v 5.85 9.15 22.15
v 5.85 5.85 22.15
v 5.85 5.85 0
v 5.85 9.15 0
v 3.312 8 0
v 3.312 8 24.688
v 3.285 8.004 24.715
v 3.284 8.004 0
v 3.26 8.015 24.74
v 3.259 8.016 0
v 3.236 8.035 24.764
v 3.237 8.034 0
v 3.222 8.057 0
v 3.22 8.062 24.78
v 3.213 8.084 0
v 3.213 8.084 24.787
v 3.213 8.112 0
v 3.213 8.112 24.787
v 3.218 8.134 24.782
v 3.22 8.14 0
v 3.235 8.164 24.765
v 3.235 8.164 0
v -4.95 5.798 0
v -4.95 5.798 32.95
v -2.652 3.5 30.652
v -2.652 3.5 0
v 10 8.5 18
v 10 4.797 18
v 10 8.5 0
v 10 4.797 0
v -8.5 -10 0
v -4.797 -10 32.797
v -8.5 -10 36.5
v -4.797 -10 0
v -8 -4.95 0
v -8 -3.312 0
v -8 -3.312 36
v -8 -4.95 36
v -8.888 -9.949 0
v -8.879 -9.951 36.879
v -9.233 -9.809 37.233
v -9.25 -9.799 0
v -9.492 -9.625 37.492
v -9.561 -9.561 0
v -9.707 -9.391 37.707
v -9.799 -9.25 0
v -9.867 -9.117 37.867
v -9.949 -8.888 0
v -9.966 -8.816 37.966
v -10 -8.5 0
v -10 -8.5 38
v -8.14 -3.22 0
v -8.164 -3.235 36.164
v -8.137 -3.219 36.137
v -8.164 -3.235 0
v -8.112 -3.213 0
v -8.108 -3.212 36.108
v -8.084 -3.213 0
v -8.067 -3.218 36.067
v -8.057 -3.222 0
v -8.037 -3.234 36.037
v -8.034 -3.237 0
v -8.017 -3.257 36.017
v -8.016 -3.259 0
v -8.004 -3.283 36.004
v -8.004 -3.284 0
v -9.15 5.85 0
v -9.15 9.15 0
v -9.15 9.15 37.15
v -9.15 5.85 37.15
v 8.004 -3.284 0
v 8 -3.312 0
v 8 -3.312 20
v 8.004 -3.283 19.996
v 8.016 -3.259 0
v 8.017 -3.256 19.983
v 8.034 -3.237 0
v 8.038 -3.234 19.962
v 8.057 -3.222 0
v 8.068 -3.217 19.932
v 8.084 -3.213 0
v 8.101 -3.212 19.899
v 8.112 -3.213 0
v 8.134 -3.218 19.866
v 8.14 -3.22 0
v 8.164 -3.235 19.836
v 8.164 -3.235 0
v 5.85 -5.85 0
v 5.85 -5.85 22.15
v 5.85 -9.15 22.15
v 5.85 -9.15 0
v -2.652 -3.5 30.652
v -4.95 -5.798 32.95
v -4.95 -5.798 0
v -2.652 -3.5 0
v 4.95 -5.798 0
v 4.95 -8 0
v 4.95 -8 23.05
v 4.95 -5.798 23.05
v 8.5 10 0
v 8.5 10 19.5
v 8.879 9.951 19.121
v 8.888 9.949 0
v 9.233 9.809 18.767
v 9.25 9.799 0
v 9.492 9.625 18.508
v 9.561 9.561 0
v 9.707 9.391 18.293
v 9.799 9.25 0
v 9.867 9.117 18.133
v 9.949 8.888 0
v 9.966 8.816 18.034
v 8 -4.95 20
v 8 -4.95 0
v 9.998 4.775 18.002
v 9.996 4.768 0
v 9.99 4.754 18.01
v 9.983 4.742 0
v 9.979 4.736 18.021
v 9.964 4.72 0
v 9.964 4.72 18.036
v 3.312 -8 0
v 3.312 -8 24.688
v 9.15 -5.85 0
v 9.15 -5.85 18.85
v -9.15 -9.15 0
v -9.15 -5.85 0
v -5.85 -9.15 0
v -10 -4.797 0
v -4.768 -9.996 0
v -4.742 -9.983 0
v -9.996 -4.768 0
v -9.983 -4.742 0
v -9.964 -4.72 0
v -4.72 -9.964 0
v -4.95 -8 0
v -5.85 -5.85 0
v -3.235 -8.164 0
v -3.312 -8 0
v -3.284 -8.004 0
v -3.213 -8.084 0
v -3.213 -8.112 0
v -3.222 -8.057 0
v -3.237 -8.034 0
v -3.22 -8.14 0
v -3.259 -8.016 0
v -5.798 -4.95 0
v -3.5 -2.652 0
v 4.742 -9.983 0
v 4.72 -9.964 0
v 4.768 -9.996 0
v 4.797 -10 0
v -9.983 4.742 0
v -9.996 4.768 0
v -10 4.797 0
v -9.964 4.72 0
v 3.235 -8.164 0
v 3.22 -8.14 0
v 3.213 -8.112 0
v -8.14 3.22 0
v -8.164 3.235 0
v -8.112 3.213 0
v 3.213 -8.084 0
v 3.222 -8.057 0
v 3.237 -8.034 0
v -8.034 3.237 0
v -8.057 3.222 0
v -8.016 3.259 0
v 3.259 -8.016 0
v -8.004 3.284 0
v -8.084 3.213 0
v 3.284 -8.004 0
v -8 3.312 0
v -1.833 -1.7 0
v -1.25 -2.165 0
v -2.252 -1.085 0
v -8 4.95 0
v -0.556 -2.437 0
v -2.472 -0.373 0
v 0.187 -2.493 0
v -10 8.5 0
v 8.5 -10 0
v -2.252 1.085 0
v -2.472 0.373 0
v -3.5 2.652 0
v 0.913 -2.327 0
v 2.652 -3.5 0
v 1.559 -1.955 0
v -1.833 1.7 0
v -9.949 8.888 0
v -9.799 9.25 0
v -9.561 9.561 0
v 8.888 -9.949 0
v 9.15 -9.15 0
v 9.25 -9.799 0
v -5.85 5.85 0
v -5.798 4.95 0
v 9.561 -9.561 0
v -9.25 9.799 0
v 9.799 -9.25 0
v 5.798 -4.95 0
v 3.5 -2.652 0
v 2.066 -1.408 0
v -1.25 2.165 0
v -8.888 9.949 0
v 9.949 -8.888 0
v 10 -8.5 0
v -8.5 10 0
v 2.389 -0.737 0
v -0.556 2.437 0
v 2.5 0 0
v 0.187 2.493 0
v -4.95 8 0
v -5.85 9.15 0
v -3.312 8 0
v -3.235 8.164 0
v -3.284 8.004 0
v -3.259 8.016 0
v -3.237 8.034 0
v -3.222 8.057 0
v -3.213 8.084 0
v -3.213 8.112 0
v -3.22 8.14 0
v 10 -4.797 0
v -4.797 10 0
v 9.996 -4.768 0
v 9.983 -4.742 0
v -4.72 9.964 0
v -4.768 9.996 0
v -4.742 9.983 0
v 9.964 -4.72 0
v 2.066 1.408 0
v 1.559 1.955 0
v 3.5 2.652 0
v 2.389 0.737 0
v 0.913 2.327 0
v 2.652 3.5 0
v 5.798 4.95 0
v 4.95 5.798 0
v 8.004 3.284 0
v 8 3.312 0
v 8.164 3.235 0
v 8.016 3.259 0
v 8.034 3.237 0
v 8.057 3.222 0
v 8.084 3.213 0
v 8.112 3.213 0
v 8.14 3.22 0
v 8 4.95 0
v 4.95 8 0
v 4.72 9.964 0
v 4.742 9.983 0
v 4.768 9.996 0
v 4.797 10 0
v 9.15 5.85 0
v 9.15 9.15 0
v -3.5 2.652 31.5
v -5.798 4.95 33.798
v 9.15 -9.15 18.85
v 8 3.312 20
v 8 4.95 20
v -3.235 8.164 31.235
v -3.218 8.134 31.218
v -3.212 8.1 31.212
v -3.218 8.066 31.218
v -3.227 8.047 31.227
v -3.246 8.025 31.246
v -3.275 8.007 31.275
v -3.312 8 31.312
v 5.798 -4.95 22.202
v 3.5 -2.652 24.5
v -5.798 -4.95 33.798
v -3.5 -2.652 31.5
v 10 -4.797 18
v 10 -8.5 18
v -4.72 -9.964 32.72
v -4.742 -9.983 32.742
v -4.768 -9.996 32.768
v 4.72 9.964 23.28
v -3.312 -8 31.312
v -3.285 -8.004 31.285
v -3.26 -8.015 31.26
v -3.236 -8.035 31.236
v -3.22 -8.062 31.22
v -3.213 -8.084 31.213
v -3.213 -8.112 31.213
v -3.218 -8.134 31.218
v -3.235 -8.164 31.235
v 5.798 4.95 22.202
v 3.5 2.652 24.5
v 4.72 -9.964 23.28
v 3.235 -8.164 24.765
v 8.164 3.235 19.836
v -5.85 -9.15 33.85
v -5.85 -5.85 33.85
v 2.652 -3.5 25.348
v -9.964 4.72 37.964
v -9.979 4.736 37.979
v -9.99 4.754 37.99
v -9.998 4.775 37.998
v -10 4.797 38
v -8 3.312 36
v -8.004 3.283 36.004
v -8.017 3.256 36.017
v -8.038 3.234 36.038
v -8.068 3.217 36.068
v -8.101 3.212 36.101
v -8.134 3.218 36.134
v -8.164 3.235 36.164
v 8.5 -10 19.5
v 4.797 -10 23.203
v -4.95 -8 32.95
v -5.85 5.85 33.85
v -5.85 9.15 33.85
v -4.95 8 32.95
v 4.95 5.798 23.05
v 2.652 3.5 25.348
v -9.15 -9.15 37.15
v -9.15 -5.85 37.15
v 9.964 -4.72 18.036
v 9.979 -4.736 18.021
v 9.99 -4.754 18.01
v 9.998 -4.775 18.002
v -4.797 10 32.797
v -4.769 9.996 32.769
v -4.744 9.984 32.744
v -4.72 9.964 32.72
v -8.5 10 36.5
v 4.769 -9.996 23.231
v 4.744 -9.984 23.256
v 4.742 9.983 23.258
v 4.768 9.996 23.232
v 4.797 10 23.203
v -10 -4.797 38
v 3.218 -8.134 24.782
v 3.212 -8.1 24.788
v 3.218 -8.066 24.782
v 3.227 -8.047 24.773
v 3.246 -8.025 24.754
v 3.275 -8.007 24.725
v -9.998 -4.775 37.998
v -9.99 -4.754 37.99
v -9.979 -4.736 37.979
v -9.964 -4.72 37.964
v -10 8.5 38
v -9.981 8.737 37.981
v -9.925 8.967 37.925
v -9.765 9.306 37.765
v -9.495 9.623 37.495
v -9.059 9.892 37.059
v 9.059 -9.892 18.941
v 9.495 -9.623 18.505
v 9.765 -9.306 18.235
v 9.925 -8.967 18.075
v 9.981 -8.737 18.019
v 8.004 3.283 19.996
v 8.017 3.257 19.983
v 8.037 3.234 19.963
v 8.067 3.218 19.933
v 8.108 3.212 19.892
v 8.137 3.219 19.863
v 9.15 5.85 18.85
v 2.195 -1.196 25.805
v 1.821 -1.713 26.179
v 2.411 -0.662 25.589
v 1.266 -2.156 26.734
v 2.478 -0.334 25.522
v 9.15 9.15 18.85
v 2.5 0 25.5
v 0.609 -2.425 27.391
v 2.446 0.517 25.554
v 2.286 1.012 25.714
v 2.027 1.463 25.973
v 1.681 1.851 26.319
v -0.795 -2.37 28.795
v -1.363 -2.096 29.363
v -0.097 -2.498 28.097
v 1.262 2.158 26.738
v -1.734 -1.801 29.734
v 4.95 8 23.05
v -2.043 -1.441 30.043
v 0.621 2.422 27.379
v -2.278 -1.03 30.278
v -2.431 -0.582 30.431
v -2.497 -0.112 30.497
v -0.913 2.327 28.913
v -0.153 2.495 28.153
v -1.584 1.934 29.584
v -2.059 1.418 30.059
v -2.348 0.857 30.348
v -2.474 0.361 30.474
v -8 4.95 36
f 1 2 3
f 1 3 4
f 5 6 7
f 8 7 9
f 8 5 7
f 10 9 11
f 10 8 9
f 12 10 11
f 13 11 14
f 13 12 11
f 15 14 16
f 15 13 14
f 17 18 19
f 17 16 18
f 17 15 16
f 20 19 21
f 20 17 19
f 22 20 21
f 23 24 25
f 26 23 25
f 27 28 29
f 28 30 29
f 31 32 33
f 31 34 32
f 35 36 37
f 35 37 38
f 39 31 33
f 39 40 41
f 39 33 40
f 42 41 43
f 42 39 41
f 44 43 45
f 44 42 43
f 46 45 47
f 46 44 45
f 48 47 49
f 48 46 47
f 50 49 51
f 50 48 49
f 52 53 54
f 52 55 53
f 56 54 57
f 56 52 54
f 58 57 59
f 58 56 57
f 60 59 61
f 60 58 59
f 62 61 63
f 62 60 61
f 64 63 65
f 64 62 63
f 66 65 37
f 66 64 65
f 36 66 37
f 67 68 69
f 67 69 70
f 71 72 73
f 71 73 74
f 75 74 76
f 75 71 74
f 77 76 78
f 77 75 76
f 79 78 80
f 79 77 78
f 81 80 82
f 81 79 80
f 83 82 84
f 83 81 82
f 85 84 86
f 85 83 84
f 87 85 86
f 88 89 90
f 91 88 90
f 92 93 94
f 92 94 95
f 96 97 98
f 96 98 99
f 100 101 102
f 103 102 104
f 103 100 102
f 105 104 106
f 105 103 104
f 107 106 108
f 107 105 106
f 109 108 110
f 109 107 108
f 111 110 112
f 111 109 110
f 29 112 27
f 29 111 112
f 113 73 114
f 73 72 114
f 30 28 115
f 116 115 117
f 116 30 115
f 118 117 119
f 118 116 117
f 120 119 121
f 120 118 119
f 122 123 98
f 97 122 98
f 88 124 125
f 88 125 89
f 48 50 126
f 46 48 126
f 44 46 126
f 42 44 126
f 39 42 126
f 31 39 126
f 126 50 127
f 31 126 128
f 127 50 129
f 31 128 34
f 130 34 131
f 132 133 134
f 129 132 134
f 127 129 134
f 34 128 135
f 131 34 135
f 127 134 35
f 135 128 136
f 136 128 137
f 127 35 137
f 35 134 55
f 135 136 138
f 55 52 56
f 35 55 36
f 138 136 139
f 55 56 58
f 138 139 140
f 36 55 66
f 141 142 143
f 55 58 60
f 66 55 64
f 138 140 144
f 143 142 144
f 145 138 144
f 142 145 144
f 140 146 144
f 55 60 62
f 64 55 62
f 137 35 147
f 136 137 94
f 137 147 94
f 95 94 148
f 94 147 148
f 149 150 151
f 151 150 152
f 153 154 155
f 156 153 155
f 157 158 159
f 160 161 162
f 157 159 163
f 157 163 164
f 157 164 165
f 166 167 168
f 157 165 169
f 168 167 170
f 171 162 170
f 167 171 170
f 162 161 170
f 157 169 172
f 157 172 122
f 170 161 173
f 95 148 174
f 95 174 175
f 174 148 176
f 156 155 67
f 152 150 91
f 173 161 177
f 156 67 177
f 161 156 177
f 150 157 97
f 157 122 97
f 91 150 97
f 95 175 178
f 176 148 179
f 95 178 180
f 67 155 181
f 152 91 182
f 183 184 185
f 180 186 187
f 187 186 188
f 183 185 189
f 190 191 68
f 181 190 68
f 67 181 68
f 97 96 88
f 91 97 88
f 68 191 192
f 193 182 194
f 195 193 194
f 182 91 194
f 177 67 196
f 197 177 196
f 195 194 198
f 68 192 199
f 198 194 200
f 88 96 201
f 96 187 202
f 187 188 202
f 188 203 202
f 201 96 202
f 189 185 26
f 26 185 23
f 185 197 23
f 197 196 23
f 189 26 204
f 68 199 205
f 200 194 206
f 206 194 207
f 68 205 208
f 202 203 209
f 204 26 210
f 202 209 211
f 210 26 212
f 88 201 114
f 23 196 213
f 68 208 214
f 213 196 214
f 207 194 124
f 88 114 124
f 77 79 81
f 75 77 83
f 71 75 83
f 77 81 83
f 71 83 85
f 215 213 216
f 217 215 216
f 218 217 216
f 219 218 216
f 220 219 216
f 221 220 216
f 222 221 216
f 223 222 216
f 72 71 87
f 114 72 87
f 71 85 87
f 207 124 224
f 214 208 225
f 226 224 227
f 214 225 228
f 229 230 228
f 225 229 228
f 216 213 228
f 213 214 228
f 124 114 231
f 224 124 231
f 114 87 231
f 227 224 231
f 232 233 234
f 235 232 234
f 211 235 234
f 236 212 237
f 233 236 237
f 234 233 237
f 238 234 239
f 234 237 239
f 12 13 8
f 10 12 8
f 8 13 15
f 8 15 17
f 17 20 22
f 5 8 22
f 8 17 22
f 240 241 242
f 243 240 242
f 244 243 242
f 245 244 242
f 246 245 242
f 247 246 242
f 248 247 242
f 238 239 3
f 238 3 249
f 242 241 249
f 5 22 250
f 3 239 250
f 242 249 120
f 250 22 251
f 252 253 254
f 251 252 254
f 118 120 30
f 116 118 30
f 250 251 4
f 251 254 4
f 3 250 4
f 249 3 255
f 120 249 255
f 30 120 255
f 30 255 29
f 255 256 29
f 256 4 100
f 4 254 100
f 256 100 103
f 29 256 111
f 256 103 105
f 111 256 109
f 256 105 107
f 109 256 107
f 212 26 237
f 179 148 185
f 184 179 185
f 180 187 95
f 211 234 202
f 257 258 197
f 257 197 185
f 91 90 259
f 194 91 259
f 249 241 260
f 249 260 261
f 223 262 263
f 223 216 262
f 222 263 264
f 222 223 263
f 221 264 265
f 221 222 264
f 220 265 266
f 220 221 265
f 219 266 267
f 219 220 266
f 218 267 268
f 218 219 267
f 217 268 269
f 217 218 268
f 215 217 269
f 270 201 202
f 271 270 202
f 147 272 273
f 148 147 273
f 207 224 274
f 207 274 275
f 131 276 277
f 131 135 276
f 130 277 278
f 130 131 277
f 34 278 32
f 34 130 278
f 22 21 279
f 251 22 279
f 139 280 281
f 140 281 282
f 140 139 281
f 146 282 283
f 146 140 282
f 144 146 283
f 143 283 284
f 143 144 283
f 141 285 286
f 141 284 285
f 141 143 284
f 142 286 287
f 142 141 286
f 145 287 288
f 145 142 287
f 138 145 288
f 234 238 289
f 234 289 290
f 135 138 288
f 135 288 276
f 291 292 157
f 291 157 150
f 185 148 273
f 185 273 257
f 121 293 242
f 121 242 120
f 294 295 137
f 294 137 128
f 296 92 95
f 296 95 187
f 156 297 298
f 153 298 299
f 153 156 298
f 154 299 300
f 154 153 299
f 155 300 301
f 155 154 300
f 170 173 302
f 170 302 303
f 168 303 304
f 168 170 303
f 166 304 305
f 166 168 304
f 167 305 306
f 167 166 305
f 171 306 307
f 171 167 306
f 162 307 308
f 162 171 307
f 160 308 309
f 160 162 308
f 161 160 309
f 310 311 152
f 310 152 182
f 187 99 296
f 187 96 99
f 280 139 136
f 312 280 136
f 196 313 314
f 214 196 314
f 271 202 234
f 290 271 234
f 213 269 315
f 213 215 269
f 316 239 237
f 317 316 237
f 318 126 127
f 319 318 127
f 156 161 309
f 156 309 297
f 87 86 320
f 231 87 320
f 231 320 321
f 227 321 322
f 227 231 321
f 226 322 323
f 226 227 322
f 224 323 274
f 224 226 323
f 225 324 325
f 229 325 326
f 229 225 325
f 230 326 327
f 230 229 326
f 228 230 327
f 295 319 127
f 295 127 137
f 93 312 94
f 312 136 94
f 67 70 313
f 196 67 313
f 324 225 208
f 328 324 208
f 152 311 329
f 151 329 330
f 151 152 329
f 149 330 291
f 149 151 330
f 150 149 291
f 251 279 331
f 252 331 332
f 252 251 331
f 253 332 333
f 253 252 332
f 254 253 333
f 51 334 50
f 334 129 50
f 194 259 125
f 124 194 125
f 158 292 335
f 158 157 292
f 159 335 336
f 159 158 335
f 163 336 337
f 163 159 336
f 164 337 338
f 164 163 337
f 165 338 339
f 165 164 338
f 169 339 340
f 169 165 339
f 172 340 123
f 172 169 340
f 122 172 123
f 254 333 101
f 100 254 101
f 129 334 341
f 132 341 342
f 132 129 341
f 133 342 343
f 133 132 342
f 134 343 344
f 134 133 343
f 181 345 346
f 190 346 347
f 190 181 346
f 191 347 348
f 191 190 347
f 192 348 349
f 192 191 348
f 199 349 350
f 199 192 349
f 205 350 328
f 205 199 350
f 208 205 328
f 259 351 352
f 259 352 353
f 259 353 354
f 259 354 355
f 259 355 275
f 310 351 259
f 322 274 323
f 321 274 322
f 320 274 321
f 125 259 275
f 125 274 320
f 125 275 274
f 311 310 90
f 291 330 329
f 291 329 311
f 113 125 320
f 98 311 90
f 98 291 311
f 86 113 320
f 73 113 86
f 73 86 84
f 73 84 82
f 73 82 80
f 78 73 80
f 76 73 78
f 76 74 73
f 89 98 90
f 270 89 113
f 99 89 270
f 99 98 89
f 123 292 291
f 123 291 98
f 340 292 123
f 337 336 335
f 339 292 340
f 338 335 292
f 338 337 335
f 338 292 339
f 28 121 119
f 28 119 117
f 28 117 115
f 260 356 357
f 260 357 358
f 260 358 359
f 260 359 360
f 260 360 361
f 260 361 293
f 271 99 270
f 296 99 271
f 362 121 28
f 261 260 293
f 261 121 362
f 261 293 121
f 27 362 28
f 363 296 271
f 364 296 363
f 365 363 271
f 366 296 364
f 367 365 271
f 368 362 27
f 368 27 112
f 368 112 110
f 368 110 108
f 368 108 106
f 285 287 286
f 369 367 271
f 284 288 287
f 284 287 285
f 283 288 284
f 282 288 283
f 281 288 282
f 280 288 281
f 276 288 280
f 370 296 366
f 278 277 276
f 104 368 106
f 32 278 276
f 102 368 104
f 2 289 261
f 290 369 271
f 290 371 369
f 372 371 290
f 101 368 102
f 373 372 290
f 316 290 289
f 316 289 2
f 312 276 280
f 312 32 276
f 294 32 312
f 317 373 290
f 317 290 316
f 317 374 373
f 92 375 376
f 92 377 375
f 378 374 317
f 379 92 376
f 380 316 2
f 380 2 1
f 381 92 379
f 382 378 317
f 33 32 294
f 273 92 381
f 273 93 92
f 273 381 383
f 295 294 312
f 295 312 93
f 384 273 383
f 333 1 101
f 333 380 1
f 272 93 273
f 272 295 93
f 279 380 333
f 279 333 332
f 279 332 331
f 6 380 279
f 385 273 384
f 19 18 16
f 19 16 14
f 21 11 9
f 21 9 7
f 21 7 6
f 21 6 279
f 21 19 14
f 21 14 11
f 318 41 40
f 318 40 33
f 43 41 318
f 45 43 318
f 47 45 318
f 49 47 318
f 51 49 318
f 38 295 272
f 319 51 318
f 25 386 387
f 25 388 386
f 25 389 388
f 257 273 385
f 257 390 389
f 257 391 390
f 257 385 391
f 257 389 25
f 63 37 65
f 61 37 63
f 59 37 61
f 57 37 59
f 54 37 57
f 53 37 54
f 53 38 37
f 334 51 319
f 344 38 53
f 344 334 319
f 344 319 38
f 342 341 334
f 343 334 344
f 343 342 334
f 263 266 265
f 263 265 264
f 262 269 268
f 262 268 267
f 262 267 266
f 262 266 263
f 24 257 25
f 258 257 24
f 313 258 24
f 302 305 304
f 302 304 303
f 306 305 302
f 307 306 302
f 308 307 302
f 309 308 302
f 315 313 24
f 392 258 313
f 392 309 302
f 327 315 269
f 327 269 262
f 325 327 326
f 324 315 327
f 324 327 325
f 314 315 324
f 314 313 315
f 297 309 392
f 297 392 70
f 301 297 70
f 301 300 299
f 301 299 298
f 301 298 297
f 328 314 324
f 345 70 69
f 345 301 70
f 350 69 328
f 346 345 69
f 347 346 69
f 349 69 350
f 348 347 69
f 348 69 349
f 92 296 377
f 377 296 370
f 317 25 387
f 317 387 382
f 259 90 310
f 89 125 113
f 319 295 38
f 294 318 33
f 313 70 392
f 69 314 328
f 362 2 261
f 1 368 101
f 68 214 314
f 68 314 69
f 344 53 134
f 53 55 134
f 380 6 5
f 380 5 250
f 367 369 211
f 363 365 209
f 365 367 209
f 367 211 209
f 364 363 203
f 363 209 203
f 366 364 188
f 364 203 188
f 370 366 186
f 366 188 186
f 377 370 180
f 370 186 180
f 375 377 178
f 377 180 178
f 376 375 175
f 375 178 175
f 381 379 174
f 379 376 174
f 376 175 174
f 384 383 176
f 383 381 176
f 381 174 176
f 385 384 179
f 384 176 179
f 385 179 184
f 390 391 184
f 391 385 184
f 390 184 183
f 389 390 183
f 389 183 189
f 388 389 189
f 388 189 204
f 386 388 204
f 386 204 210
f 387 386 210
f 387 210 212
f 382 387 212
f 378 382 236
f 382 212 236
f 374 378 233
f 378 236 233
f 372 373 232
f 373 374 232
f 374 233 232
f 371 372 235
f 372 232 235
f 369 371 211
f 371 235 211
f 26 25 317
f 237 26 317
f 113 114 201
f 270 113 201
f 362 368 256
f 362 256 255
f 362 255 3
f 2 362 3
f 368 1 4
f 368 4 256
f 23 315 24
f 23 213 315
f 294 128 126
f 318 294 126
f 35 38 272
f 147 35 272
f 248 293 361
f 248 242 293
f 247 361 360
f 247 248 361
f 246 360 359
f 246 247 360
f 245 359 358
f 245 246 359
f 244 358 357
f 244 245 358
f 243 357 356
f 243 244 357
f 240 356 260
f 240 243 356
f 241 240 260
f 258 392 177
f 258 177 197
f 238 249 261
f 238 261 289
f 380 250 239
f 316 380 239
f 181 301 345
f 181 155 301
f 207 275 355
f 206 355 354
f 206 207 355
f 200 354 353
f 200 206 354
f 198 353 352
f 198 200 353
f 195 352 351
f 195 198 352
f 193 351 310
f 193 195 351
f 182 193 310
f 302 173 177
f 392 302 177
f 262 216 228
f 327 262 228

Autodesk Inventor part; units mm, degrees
ref_plane "Начальная плоскость" through (0, 0, 0) normal (0, 0, 1) x (1, 0, 0)
ref_plane "Конечная плоскость" through (0, 0, 38) normal (0, 0, 1) x (1, 0, 0)
sketch "Эскиз" plane through (0, 0, 0) normal (0, 0, 1) x (1, 0, 0)
  line L0 (-14.4349, 0) -> (14.4349, 0) projected
  line L1 (0, -14) -> (0, 14) projected
  line L2 (0, 0) -> (7.5, 7.5) construction
  circle A0 centre (7.5, 7.5) radius 1.65 construction
  line L3 (5.85, 9.15) -> (9.15, 9.15)
  line L4 (9.15, 9.15) -> (9.15, 5.85)
  line L5 (9.15, 5.85) -> (5.85, 5.85)
  line L6 (5.85, 5.85) -> (5.85, 9.15)
  line L7 (3.235, 8.1636) -> (4.72, 9.9636)
  line L8 (4.7971, 10) -> (8.5, 10)
  line L9 (3.3121, 8) -> (4.95, 8)
  line L10 (4.95, 8) -> (4.95, 5.7985)
  line L11 (4.95, 5.7985) -> (2.6515, 3.5)
  line L12 (0, 3.5) -> (2.6515, 3.5)
  circle A1 centre (0, 0) radius 2.5
  line L13 (8.1636, 3.235) -> (9.9636, 4.72)
  line L14 (10, 4.7971) -> (10, 8.5)
  line L15 (8, 3.3121) -> (8, 4.95)
  line L16 (8, 4.95) -> (5.7985, 4.95)
  line L17 (5.7985, 4.95) -> (3.5, 2.6515)
  line L18 (3.5, 0) -> (3.5, 2.6515)
  arc A2 (10, 8.5) -> (8.5, 10) centre (8.5, 8.5) ccw
  line L19 (0, 0) -> (-7.5, 7.5) construction
  circle A3 centre (-7.5, 7.5) radius 1.65 construction
  line L20 (-5.85, 9.15) -> (-9.15, 9.15)
  line L21 (-9.15, 9.15) -> (-9.15, 5.85)
  line L22 (-9.15, 5.85) -> (-5.85, 5.85)
  line L23 (-5.85, 5.85) -> (-5.85, 9.15)
  line L24 (-3.235, 8.1636) -> (-4.72, 9.9636)
  line L25 (-4.7971, 10) -> (-8.5, 10)
  line L26 (-3.3121, 8) -> (-4.95, 8)
  line L27 (-4.95, 8) -> (-4.95, 5.7985)
  line L28 (-4.95, 5.7985) -> (-2.6515, 3.5)
  line L29 (0, 3.5) -> (-2.6515, 3.5)
  line L30 (-3.5, 0) -> (-3.5, 2.6515)
  line L31 (-5.7985, 4.95) -> (-3.5, 2.6515)
  line L32 (-8, 4.95) -> (-5.7985, 4.95)
  line L33 (-8, 3.3121) -> (-8, 4.95)
  line L34 (-8.1636, 3.235) -> (-9.9636, 4.72)
  line L35 (-10, 4.7971) -> (-10, 8.5)
  arc A4 (-8.5, 10) -> (-10, 8.5) centre (-8.5, 8.5) ccw
  line L36 (0, 14) -> (0, -14)
  line L37 (0, 0) -> (7.5, -7.5) construction
  circle A5 centre (7.5, -7.5) radius 1.65 construction
  line L38 (5.85, -9.15) -> (9.15, -9.15)
  line L39 (9.15, -9.15) -> (9.15, -5.85)
  line L40 (9.15, -5.85) -> (5.85, -5.85)
  line L41 (5.85, -5.85) -> (5.85, -9.15)
  line L42 (3.235, -8.1636) -> (4.72, -9.9636)
  line L43 (4.7971, -10) -> (8.5, -10)
  line L44 (3.3121, -8) -> (4.95, -8)
  line L45 (4.95, -8) -> (4.95, -5.7985)
  line L46 (4.95, -5.7985) -> (2.6515, -3.5)
  line L47 (0, -3.5) -> (2.6515, -3.5)
  line L48 (3.5, 0) -> (3.5, -2.6515)
  line L49 (5.7985, -4.95) -> (3.5, -2.6515)
  line L50 (8, -4.95) -> (5.7985, -4.95)
  line L51 (8, -3.3121) -> (8, -4.95)
  line L52 (8.1636, -3.235) -> (9.9636, -4.72)
  line L53 (10, -4.7971) -> (10, -8.5)
  arc A6 (8.5, -10) -> (10, -8.5) centre (8.5, -8.5) ccw
  line L54 (0, 0) -> (-7.5, -7.5) construction
  line L55 (-4.95, -8) -> (-4.95, -5.7985)
  line L56 (-3.3121, -8) -> (-4.95, -8)
  line L57 (-5.7985, -4.95) -> (-3.5, -2.6515)
  line L58 (-4.95, -5.7985) -> (-2.6515, -3.5)
  line L59 (-3.5, 0) -> (-3.5, -2.6515)
  line L60 (0, -3.5) -> (-2.6515, -3.5)
  circle A7 centre (-7.5, -7.5) radius 1.65 construction
  line L61 (-5.85, -5.85) -> (-5.85, -9.15)
  line L62 (-5.85, -9.15) -> (-9.15, -9.15)
  line L63 (-9.15, -9.15) -> (-9.15, -5.85)
  line L64 (-9.15, -5.85) -> (-5.85, -5.85)
  line L65 (-3.235, -8.1636) -> (-4.72, -9.9636)
  line L66 (-8, -4.95) -> (-5.7985, -4.95)
  line L67 (-8, -3.3121) -> (-8, -4.95)
  line L68 (-8.1636, -3.235) -> (-9.9636, -4.72)
  line L69 (-4.7971, -10) -> (-8.5, -10)
  line L70 (-10, -4.7971) -> (-10, -8.5)
  arc A8 (-10, -8.5) -> (-8.5, -10) centre (-8.5, -8.5) ccw
  arc A9 (3.235, 8.1636) -> (3.3121, 8) centre (3.3121, 8.1) ccw
  arc A10 (4.7971, 10) -> (4.72, 9.9636) centre (4.7971, 9.9) ccw
  arc A11 (8, 3.3121) -> (8.1636, 3.235) centre (8.1, 3.3121) ccw
  arc A12 (9.9636, 4.72) -> (10, 4.7971) centre (9.9, 4.7971) ccw
  arc A13 (-3.3121, 8) -> (-3.235, 8.1636) centre (-3.3121, 8.1) ccw
  arc A14 (-4.72, 9.9636) -> (-4.7971, 10) centre (-4.7971, 9.9) ccw
  arc A15 (-8.1636, 3.235) -> (-8, 3.3121) centre (-8.1, 3.3121) ccw
  arc A16 (-10, 4.7971) -> (-9.9636, 4.72) centre (-9.9, 4.7971) ccw
  arc A17 (-8, -3.3121) -> (-8.1636, -3.235) centre (-8.1, -3.3121) ccw
  arc A18 (-9.9636, -4.72) -> (-10, -4.7971) centre (-9.9, -4.7971) ccw
  arc A19 (-3.235, -8.1636) -> (-3.3121, -8) centre (-3.3121, -8.1) ccw
  arc A20 (-4.7971, -10) -> (-4.72, -9.9636) centre (-4.7971, -9.9) ccw
  arc A21 (4.72, -9.9636) -> (4.7971, -10) centre (4.7971, -9.9) ccw
  arc A22 (3.3121, -8) -> (3.235, -8.1636) centre (3.3121, -8.1) ccw
  arc A23 (8.1636, -3.235) -> (8, -3.3121) centre (8.1, -3.3121) ccw
  arc A24 (10, -4.7971) -> (9.9636, -4.72) centre (9.9, -4.7971) ccw
  point P0 (3.1, 8)
  point P1 (4.75, 10)
  point P2 (7.5, 9.15)
  point P3 (8, 3.1)
  point P4 (10, 4.75)
  point P5 (7.5, 5.85)
  point P6 (9.15, 7.5)
  point P7 (-3.1, 8)
  point P8 (-4.75, 10)
  point P9 (-7.5, 9.15)
  point P10 (-8, 3.1)
  point P11 (-10, 4.75)
  point P12 (-7.5, 5.85)
  point P13 (-9.15, 7.5)
  point P14 (3.1, -8)
  point P15 (4.75, -10)
  point P16 (7.5, -9.15)
  point P17 (8, -3.1)
  point P18 (10, -4.75)
  point P19 (7.5, -5.85)
  point P20 (9.15, -7.5)
  point P21 (-3.1, -8)
  point P22 (-7.5, -5.85)
  point P23 (-7.5, -9.15)
  point P24 (-9.15, -7.5)
  point P25 (-4.75, -10)
  point P26 (-8, -3.1)
  point P27 (-10, -4.75)
  dimension "d0" = 45
  dimension "d1" = 3.3
  dimension "d2" = 1.5
  dimension "d3" = 1.2
  dimension "d4" = 5
  dimension "d5" = 6.5
  dimension "d6" = 15
  dimension "d7" = 20
  dimension "d8" = 9.9
  dimension "d9" = 9.5
  dimension "d10" = 6.2
  dimension "d11" = 2
  dimension "d18" = 0.1
  dimension "d19" = 0.1
extrude "Тело" add sketch "Эскиз" along normal up to surface (38 mm away) from surface at 0 contours A1 L1 L12 L11 L10 L9 A9 L7 A10 L8 A2 L14 A12 L13 A11 L15 L16 L17 L18 L0 | L0 L48 L49 L50 L51 A23 L52 A24 L53 A6 L43 A21 L42 A22 L44 L45 L46 L47 L1 A1 | A1 L0 L30 L31 L32 L33 A15 L34 A16 L35 A4 L25 A14 L24 A13 L26 L27 L28 L29 L1 | L1 L60 L58 L55 L56 A19 L65 A20 L69 A8 L70 A18 L68 A17 L67 L66 L57 L59 L0 A1
sketch "Эскиз2" plane through (0, 0, 0) normal (0, 0, 1) x (1, 0, 0)
  line L0 (0, 0) -> (10, 0)
ref_plane "РабПлоскость3" through (0, 0, 0) normal (0, -1, 0) x (1, 0, 0)
sketch "Эскиз3" plane through (0, 0, 0) normal (0, -1, 0) x (1, 0, 0)
  line L0 (-2, 0) -> (12, 0)
  line L1 (-2, 38) -> (12, 38)
  dimension "d25" = 38
ref_plane "РабПлоскость4" through (-10, 0, 38) normal (0.7071, 0, 0.7071) x (0.7071, 0, -0.7071)
split "Разделение1" plane through (-10, 0, 38) removes the side toward (0.7071, 0, 0.7071)
equation "\"Длина\" = 28"
equation "\"G_OFFSET_START\" = 0"
equation "\"d21\" = Длина + G_OFFSET_END"
equation "\"G_L\" = d25"
equation "\"G_OFFSET_END\" = 10"
properties part number "короткая палка"
